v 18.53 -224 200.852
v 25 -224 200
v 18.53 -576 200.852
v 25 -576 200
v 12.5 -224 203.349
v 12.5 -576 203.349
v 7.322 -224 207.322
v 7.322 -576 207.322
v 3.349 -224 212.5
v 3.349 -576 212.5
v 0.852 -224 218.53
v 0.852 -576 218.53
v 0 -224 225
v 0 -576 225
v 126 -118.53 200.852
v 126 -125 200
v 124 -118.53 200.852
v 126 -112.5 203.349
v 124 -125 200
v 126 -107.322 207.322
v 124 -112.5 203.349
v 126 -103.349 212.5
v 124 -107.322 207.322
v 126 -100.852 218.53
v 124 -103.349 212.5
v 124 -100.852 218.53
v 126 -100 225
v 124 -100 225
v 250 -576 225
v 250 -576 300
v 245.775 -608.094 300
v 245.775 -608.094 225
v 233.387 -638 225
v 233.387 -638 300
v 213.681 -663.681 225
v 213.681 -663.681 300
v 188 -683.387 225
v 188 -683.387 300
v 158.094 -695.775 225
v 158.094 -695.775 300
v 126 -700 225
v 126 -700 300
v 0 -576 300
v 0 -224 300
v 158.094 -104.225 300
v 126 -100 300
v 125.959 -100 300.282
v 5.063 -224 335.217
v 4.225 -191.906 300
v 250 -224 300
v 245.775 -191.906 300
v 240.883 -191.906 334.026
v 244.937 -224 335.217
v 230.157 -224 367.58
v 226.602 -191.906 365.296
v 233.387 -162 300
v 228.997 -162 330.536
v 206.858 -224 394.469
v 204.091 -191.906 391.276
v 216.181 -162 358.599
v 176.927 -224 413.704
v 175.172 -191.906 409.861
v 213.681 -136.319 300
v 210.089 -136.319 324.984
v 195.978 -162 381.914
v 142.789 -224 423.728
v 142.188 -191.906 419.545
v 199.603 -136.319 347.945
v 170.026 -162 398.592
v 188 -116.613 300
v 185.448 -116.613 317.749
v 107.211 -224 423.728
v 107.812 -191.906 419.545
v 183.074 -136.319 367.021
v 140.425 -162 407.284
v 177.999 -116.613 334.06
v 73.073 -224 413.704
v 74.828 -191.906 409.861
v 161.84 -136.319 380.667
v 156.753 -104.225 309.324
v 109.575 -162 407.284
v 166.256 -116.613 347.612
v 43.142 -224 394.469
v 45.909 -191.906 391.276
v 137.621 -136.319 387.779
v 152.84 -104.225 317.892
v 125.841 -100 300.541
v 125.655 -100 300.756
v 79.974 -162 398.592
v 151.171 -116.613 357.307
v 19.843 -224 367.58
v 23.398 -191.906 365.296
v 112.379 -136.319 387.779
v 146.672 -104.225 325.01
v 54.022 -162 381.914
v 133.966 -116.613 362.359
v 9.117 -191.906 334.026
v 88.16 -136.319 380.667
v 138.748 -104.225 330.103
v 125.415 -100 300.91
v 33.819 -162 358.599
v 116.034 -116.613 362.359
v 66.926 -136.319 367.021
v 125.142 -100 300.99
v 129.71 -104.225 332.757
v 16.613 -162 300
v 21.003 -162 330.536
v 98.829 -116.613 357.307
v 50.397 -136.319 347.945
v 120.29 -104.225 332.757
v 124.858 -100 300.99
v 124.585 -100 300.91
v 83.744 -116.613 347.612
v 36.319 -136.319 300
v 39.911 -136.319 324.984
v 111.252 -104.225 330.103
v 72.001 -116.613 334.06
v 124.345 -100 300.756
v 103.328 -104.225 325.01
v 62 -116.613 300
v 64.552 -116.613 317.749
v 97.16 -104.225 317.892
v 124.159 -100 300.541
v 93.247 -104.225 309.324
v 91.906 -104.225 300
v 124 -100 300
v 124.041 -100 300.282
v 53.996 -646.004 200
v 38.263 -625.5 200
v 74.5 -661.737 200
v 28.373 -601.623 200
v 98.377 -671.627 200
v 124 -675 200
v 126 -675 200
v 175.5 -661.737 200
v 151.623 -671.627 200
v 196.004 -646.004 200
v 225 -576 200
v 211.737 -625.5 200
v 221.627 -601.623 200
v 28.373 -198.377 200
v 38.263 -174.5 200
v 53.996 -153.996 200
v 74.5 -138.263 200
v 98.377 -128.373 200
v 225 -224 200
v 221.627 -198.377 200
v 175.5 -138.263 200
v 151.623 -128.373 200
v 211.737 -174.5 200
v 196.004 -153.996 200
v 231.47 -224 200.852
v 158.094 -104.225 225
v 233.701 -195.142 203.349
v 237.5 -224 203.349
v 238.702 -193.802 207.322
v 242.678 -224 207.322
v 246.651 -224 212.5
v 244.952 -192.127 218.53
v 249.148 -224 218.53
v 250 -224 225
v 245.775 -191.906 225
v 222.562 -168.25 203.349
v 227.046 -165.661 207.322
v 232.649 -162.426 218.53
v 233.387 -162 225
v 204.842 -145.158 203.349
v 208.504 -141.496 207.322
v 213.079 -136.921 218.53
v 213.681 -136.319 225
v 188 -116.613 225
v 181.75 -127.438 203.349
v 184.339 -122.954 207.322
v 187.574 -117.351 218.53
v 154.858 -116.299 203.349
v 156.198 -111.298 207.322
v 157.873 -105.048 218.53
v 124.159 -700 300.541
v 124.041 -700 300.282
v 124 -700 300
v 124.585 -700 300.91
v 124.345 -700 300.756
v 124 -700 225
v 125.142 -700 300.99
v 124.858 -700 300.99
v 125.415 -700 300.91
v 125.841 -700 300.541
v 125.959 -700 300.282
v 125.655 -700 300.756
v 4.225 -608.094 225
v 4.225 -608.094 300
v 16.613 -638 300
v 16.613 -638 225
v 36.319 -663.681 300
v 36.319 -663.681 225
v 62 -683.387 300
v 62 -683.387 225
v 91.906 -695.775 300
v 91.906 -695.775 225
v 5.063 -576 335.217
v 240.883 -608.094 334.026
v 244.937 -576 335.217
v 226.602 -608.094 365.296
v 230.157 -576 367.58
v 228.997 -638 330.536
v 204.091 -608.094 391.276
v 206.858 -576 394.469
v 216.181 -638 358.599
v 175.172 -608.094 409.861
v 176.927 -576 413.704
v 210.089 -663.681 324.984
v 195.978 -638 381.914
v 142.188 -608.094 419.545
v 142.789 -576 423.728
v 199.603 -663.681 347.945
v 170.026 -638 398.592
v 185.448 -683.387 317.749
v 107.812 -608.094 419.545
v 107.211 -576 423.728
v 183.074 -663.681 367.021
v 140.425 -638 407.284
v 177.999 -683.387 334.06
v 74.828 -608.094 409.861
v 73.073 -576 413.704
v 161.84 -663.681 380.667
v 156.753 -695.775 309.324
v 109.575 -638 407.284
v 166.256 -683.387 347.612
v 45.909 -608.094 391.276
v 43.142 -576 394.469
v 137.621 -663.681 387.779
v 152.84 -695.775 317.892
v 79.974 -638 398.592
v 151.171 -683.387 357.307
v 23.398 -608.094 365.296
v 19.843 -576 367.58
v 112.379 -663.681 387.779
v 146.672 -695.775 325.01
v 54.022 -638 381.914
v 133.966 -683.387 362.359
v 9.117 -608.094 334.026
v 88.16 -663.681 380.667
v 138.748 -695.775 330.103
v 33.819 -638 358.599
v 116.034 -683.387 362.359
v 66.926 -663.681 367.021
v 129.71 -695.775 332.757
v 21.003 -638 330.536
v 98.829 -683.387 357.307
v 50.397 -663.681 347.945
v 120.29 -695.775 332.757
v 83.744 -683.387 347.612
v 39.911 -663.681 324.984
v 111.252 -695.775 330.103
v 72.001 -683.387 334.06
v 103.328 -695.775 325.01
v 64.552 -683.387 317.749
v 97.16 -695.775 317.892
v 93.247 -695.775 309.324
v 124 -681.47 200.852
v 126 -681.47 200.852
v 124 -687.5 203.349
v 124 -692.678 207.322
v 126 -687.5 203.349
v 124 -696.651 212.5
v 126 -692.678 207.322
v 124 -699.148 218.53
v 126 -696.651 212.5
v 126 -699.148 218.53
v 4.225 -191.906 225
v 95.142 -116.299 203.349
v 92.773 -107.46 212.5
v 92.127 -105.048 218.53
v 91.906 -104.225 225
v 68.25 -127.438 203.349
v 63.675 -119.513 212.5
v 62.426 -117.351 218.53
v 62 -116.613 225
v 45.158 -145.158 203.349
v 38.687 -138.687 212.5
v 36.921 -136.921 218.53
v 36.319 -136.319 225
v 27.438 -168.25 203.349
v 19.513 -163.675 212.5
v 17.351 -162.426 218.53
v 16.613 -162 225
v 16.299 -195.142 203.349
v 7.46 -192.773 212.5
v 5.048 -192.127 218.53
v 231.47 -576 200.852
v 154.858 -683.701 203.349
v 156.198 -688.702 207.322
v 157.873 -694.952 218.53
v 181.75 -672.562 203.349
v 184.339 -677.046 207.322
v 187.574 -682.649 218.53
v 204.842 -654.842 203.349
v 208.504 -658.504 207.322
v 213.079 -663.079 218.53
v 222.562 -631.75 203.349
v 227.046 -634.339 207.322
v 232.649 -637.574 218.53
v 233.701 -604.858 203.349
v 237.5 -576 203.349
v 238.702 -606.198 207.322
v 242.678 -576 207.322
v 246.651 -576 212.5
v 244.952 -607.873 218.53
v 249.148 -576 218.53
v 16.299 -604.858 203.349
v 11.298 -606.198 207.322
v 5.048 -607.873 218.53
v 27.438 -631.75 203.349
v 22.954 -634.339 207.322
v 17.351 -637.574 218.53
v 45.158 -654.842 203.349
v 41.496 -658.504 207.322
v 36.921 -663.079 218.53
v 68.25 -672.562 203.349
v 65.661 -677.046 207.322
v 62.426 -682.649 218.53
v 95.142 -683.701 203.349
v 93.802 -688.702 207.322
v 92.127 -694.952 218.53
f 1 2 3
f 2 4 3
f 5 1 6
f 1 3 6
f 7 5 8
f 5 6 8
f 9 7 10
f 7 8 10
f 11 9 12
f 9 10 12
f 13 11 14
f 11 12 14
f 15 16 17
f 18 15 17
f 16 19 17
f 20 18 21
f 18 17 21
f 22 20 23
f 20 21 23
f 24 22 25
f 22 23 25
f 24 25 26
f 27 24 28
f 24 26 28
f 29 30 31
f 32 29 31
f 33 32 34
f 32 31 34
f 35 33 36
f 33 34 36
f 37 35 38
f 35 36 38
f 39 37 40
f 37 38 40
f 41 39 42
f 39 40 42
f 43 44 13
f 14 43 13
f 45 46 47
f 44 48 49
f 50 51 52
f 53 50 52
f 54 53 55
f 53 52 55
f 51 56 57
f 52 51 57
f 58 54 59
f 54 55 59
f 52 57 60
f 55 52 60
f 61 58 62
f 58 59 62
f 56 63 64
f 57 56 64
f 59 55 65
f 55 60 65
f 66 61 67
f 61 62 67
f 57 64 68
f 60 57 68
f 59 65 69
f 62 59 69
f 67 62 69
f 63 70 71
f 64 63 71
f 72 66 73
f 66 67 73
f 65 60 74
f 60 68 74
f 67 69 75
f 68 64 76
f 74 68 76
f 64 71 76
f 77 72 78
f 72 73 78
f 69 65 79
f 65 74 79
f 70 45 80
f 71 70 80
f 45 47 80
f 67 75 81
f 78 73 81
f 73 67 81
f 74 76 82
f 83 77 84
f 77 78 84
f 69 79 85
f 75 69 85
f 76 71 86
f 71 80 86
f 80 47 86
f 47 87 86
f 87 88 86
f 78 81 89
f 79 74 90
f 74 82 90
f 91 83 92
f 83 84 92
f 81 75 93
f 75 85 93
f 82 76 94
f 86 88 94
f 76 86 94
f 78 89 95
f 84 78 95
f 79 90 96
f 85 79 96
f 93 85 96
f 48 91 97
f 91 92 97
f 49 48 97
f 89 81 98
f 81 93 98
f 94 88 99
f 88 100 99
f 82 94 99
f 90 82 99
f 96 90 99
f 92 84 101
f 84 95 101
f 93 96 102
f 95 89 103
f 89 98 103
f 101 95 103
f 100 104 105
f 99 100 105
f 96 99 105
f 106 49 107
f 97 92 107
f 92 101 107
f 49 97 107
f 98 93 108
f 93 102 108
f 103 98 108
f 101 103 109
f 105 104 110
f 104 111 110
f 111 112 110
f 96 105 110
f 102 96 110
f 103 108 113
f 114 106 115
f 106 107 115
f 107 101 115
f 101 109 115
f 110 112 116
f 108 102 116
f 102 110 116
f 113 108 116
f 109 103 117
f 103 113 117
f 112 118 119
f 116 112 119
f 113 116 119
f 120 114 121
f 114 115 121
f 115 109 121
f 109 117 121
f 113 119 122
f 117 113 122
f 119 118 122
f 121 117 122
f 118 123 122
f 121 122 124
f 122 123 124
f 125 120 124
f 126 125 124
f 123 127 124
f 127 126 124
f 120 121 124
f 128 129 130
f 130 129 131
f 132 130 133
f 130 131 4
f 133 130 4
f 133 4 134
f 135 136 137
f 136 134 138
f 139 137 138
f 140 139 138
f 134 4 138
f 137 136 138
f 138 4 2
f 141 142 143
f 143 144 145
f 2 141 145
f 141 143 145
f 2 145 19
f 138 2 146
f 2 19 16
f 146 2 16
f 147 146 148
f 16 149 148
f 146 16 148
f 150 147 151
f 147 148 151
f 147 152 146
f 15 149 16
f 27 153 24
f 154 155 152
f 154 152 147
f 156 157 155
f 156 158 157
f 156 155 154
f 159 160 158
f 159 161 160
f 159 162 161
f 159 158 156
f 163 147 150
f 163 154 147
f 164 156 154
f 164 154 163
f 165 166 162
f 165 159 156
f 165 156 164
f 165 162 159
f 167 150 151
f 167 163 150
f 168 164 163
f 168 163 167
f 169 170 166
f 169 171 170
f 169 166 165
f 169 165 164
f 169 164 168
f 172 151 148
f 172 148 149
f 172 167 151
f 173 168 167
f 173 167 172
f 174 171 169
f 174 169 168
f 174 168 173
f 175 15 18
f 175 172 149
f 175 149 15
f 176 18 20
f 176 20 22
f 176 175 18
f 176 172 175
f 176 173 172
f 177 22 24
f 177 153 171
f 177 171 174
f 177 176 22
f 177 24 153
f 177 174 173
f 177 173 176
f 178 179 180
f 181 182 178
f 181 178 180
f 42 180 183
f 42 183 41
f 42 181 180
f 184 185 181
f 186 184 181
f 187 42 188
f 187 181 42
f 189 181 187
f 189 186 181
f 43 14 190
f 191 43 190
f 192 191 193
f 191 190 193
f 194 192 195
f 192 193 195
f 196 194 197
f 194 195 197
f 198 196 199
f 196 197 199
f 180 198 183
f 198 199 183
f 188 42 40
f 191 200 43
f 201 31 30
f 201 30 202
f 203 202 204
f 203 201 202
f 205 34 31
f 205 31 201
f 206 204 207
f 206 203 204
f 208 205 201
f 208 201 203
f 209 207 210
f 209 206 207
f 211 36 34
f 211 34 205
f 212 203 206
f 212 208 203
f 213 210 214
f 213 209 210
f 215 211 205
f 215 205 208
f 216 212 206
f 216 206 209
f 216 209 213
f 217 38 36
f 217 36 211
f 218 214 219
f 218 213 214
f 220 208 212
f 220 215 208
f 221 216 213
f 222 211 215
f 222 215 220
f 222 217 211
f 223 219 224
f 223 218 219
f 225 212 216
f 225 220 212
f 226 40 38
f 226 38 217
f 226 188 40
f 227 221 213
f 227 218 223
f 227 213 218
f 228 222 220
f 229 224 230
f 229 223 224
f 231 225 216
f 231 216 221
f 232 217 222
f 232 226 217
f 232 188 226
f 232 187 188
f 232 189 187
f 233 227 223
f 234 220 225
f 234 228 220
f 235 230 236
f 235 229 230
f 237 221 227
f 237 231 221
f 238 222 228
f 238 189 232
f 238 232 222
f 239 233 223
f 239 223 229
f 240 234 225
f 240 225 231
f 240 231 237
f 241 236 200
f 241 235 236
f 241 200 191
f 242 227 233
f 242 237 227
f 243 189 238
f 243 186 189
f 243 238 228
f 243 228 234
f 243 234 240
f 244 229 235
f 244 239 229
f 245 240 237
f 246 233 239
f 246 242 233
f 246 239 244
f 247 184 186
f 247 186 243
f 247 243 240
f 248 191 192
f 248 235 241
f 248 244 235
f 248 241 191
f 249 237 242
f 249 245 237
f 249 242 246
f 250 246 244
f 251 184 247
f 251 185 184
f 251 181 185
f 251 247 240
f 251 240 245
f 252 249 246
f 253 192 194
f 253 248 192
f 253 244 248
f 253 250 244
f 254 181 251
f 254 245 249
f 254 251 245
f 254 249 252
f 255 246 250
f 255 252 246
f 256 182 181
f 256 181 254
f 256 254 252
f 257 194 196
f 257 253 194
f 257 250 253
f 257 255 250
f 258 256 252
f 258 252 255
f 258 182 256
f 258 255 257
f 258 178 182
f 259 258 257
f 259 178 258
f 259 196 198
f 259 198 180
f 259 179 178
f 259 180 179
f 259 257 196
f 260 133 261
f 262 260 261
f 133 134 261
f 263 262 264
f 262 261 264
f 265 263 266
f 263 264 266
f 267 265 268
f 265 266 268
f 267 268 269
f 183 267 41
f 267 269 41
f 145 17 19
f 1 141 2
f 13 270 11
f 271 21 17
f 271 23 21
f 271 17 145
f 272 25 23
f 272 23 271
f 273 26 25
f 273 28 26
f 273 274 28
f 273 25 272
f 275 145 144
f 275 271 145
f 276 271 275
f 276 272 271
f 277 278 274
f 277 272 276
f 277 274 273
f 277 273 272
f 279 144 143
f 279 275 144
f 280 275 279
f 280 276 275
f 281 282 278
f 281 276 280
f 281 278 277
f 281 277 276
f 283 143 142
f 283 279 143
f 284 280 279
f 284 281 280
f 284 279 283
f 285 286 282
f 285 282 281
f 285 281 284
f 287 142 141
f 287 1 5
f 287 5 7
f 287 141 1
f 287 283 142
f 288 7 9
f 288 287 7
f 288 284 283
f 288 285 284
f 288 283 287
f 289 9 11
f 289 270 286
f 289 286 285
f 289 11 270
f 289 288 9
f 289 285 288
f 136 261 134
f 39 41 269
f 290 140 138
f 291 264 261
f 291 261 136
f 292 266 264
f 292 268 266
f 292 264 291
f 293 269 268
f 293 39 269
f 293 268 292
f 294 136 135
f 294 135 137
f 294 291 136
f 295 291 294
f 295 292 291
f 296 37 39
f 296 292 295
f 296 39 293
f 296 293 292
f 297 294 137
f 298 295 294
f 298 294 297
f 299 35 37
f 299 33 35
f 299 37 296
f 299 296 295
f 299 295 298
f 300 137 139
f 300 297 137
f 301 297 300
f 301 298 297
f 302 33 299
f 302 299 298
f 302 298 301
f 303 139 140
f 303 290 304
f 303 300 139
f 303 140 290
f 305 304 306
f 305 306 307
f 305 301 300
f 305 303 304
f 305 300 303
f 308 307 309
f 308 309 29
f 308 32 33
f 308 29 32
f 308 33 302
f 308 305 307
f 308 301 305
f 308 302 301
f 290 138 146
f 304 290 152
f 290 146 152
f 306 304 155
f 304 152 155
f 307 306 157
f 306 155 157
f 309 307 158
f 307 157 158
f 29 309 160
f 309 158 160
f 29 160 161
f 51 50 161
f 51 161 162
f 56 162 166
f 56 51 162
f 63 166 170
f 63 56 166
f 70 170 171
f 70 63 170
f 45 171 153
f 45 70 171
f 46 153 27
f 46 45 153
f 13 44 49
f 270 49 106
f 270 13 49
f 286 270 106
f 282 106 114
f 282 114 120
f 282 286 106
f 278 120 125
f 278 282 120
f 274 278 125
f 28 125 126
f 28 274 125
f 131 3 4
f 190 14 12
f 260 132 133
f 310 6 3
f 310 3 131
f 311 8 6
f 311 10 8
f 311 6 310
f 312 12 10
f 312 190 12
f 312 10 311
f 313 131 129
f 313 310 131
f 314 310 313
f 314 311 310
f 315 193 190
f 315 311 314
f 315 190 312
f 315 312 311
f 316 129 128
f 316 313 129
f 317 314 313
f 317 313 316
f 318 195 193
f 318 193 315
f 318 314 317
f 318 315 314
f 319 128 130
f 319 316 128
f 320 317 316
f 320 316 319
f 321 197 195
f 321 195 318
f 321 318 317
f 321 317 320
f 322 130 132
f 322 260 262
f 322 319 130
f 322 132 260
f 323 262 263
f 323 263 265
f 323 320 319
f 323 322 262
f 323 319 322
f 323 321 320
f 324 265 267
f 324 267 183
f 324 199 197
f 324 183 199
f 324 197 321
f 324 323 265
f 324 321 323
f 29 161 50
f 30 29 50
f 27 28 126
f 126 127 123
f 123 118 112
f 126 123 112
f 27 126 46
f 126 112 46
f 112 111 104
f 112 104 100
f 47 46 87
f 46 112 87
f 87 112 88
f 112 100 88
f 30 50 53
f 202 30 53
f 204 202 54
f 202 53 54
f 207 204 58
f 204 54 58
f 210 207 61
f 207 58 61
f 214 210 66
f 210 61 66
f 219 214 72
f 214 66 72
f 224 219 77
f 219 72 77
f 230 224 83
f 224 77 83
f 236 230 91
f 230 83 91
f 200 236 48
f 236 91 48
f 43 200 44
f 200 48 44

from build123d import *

# Parameters (mm, degrees)
PAD002_DEPTH = 600
FILLET002_R  = 124
FILLET003_R  = 25


with BuildPart() as part:
    # Sketch002 → Pad002 (new body)
    with BuildSketch(Plane.XZ):
        with BuildLine():
            Line((0, 0), (250, 0))
            Line((250, 0), (250, 100))
            ThreePointArc((250, 100), (125, 225), (0, 100))
            Line((0, 100), (0, 0))
        make_face()
    extrude(amount=PAD002_DEPTH)

    # Fillet002
    fillet002_edges = [part.edges().sort_by_distance(p)[0] for p in [
        (125, 0, 225),
        (125, -600, 225),
    ]]
    fillet(fillet002_edges, radius=FILLET002_R)

    # Fillet003
    fillet003_edges = [part.edges().sort_by_distance(p)[0] for p in [
        (0, -300, 0),
        (36.318759, -36.318759, 0),
        (36.318759, -563.681241, 0),
        (125, 0, 0),
        (125, -600, 0),
        (213.681241, -36.318759, 0),
        (213.681241, -563.681241, 0),
        (250, -300, 0),
        (0, -300, 100),
        (0, -124, 50),
        (0, -476, 50),
        (36.318759, -36.318759, 100),
        (124, 0, 50),
        (36.318759, -563.681241, 100),
        (124, -600, 50),
        (126, 0, 50),
        (125, 0, 101),
        (126, -600, 50),
        (125, -600, 101),
        (250, -124, 50),
        (213.681241, -36.318759, 100),
        (250, -476, 50),
        (213.681241, -563.681241, 100),
        (250, -300, 100),
        (125, -124, 225),
        (125, -476, 225),
    ]]
    fillet(fillet003_edges, radius=FILLET003_R)


with BuildPart() as part_1:
    # Body002 placement: moved
    add(part.part.moved(Location((0, -100, 200))))


solid = part_1.part
